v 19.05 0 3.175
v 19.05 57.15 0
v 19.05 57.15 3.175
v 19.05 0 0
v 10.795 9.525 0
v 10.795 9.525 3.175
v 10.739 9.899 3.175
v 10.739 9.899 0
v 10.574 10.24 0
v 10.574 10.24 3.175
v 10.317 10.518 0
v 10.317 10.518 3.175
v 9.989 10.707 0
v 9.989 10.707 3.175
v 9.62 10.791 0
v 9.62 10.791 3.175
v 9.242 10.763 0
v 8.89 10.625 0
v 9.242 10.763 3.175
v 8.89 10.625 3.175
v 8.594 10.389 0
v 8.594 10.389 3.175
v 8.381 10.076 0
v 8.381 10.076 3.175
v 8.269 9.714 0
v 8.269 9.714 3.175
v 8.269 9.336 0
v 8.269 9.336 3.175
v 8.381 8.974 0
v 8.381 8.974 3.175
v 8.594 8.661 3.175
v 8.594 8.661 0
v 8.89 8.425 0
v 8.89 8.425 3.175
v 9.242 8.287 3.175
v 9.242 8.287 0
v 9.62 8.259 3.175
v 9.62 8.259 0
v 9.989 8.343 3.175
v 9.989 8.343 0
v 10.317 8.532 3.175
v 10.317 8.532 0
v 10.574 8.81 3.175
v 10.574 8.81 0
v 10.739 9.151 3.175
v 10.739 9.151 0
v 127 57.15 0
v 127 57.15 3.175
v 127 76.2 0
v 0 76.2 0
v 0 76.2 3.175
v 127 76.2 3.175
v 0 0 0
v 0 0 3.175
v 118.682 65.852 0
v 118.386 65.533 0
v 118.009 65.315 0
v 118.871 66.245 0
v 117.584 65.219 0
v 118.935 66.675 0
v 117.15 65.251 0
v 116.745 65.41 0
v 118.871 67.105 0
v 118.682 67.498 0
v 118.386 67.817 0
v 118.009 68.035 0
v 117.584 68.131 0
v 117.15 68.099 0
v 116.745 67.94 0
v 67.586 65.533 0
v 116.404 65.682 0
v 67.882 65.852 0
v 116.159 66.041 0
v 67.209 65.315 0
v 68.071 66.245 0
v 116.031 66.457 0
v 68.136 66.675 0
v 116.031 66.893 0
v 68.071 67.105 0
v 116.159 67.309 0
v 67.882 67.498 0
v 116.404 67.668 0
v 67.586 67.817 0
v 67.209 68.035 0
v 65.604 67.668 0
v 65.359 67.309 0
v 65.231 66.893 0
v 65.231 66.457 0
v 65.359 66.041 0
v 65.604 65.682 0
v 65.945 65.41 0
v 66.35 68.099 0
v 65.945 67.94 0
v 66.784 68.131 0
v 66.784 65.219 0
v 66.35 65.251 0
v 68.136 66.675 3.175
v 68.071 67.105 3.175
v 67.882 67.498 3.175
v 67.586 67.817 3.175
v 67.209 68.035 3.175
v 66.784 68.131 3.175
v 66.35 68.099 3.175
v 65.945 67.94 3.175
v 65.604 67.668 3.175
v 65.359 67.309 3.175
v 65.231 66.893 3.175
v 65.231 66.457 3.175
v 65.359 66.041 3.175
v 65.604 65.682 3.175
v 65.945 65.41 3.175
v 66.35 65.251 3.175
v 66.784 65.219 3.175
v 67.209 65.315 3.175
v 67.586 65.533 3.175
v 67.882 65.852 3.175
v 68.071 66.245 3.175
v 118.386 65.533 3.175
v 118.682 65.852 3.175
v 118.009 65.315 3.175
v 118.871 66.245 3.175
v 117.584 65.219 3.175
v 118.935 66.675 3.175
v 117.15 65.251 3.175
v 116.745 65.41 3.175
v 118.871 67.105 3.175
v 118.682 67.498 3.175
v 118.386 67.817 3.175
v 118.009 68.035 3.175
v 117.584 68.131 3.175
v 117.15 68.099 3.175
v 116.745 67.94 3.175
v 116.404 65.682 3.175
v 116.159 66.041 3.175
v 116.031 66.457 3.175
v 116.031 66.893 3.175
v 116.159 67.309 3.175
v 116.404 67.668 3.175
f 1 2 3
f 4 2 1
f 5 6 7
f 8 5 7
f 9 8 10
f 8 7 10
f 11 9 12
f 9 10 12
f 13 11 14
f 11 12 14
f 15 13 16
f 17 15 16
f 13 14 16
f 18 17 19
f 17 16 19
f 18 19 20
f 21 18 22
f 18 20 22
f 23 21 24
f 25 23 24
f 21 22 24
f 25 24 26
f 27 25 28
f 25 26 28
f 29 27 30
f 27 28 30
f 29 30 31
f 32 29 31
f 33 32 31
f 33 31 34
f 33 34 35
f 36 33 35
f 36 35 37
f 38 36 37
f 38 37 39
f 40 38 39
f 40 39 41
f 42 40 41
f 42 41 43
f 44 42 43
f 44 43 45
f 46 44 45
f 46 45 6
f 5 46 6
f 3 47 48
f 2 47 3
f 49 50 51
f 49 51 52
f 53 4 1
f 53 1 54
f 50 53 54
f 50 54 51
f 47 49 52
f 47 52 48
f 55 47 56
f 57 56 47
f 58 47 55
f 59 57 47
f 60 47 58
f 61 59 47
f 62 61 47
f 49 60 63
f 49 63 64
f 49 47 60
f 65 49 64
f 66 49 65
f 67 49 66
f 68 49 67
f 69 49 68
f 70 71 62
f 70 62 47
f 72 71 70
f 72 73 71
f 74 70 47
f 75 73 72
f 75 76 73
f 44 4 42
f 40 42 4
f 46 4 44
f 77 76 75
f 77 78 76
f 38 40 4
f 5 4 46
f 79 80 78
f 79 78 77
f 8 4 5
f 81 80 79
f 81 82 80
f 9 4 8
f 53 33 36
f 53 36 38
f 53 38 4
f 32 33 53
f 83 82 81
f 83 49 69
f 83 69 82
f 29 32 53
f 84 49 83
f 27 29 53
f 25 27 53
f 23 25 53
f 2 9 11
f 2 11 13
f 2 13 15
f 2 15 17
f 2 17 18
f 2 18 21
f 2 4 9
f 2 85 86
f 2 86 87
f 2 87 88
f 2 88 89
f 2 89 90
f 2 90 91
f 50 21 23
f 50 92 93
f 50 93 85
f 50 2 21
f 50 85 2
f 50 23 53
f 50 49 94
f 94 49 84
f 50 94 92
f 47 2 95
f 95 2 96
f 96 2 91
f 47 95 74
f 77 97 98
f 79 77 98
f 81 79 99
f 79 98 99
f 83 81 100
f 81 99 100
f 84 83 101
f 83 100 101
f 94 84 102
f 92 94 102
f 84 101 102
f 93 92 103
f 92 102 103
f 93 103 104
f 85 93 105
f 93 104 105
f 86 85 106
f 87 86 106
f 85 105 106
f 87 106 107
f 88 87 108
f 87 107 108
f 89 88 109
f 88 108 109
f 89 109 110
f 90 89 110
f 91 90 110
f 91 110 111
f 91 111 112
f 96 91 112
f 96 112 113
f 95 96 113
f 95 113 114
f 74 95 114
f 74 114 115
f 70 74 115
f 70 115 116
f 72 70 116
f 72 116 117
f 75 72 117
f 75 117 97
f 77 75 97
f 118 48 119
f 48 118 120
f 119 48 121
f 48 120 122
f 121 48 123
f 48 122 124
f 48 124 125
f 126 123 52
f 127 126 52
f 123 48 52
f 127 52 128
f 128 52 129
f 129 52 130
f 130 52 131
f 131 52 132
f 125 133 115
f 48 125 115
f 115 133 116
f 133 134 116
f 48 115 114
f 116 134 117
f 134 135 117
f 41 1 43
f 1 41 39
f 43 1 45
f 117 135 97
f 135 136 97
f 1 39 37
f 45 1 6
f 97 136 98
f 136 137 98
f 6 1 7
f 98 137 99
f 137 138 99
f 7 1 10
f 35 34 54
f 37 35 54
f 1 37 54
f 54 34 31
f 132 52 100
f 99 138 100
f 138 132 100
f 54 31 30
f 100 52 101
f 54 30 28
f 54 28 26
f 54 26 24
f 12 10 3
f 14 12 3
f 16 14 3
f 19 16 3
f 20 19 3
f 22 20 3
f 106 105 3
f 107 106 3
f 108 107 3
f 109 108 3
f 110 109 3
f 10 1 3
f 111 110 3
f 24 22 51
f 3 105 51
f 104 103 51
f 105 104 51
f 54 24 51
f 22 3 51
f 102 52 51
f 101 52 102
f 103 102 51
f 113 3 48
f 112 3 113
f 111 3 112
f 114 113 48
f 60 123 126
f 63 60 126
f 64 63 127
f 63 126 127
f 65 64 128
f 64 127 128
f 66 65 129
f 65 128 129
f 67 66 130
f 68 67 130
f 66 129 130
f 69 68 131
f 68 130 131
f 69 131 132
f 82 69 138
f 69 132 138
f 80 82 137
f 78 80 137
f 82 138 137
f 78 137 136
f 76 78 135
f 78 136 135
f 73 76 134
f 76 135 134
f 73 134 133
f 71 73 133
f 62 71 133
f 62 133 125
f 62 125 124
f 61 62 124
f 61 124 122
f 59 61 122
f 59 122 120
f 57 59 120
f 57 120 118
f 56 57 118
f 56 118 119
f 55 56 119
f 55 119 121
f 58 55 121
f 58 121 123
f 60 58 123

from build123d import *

# Parameters (mm, degrees)
BOSS_EXTRUDE1_DEPTH = 3.175
SKETCH2_R           = 1.27
SKETCH2_R_2         = 1.4605
CUT_EXTRUDE1_DEPTH  = 149.140205971


with BuildPart() as part:
    # Sketch1 → Boss-Extrude1 (new body)
    with BuildSketch(Plane.XY):
        Polygon((0, 0), (0, 76.2), (127, 76.2), (127, 57.15), (19.05, 57.15), (19.05, 0), align=None)
    extrude(amount=BOSS_EXTRUDE1_DEPTH)

    # Sketch2 → Cut-Extrude1 (cut, through all)
    with BuildSketch(Plane.XY.offset(3.175)):
        with Locations((9.525, 9.525)):
            Circle(SKETCH2_R)
        with Locations((117.475, 66.675)):
            Circle(SKETCH2_R_2)
        with Locations((66.675, 66.675)):
            Circle(SKETCH2_R_2)
    extrude(amount=-CUT_EXTRUDE1_DEPTH, mode=Mode.SUBTRACT)


solid = part.part
